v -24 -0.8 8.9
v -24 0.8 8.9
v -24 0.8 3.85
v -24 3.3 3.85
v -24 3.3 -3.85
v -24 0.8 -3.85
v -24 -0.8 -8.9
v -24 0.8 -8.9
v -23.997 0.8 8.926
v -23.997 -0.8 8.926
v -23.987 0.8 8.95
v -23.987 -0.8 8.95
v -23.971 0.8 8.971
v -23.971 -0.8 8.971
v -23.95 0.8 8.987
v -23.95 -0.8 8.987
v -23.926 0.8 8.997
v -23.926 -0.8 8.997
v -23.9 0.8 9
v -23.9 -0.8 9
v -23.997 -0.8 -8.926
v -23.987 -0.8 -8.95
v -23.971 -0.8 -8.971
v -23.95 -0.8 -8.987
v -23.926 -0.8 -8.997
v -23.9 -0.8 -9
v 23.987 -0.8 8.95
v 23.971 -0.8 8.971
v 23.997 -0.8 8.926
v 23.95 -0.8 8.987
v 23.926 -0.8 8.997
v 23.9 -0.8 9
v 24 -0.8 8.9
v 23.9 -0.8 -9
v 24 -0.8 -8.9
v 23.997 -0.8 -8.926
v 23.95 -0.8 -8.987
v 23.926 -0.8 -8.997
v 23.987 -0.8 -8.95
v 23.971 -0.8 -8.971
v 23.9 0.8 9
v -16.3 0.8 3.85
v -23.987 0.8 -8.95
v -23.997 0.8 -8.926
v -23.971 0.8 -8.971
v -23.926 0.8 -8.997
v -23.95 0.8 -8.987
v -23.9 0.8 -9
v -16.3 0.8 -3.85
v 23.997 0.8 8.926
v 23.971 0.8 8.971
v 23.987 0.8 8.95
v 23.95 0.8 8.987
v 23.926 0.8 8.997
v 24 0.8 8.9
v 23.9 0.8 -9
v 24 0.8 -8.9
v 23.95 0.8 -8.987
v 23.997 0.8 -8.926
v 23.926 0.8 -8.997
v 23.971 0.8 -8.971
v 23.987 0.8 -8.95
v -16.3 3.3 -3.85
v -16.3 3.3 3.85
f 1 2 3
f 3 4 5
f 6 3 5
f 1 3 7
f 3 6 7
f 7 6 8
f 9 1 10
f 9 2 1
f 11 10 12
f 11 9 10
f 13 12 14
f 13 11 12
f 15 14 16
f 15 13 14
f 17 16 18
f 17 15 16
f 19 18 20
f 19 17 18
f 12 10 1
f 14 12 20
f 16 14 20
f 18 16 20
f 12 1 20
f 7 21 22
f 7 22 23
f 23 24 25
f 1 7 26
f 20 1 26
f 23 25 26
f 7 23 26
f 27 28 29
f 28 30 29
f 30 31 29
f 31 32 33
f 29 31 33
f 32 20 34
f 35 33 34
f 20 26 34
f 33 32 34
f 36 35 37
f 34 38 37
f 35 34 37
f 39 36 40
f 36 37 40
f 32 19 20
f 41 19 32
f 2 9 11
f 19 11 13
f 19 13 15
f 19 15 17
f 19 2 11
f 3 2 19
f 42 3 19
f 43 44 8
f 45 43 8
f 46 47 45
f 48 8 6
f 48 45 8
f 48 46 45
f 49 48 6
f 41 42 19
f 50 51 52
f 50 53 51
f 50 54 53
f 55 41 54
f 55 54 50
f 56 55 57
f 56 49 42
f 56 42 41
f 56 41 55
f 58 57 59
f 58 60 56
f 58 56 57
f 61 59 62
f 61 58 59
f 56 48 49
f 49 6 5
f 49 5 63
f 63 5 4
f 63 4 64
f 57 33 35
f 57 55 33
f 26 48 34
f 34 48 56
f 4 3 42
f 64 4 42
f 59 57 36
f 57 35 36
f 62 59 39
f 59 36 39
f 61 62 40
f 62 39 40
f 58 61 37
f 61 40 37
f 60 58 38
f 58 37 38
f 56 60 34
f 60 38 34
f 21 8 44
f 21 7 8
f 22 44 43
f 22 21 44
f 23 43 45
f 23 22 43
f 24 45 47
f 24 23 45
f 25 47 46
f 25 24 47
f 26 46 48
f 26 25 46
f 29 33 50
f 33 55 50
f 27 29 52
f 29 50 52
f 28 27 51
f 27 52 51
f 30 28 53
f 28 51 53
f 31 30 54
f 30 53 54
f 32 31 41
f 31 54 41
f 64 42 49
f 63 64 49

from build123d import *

# Parameters (mm, degrees)
SKETCH1_W           = 48
SKETCH1_H           = 18
BOSS_EXTRUDE1_DEPTH = 0.8
FILLET1_R           = 0.1
SKETCH3_W           = 7.7
SKETCH3_H           = 7.7
BOSS_EXTRUDE2_DEPTH = 2.5


with BuildPart() as part:
    # Sketch1 → Boss-Extrude1 (new, symmetric)
    with BuildSketch(Plane(origin=(0, 0, 0), x_dir=(1, 0, 0), z_dir=(0, 1, 0))):
        Rectangle(SKETCH1_W, SKETCH1_H)
    extrude(amount=BOSS_EXTRUDE1_DEPTH, both=True)

    # Fillet1
    fillet1_edges = [part.edges().sort_by_distance(p)[0] for p in [
        (24, 0, 9),
        (-24, 0, 9),
        (-24, 0, -9),
        (24, 0, -9),
    ]]
    fillet(fillet1_edges, radius=FILLET1_R)

    # Sketch3 → Boss-Extrude2 (add)
    with BuildSketch(Plane(origin=(0, 0.8, 0), x_dir=(1, 0, 0), z_dir=(0, 1, 0))):
        with Locations((-20.15, 0)):
            Rectangle(SKETCH3_W, SKETCH3_H)
    extrude(amount=BOSS_EXTRUDE2_DEPTH)


solid = part.part
